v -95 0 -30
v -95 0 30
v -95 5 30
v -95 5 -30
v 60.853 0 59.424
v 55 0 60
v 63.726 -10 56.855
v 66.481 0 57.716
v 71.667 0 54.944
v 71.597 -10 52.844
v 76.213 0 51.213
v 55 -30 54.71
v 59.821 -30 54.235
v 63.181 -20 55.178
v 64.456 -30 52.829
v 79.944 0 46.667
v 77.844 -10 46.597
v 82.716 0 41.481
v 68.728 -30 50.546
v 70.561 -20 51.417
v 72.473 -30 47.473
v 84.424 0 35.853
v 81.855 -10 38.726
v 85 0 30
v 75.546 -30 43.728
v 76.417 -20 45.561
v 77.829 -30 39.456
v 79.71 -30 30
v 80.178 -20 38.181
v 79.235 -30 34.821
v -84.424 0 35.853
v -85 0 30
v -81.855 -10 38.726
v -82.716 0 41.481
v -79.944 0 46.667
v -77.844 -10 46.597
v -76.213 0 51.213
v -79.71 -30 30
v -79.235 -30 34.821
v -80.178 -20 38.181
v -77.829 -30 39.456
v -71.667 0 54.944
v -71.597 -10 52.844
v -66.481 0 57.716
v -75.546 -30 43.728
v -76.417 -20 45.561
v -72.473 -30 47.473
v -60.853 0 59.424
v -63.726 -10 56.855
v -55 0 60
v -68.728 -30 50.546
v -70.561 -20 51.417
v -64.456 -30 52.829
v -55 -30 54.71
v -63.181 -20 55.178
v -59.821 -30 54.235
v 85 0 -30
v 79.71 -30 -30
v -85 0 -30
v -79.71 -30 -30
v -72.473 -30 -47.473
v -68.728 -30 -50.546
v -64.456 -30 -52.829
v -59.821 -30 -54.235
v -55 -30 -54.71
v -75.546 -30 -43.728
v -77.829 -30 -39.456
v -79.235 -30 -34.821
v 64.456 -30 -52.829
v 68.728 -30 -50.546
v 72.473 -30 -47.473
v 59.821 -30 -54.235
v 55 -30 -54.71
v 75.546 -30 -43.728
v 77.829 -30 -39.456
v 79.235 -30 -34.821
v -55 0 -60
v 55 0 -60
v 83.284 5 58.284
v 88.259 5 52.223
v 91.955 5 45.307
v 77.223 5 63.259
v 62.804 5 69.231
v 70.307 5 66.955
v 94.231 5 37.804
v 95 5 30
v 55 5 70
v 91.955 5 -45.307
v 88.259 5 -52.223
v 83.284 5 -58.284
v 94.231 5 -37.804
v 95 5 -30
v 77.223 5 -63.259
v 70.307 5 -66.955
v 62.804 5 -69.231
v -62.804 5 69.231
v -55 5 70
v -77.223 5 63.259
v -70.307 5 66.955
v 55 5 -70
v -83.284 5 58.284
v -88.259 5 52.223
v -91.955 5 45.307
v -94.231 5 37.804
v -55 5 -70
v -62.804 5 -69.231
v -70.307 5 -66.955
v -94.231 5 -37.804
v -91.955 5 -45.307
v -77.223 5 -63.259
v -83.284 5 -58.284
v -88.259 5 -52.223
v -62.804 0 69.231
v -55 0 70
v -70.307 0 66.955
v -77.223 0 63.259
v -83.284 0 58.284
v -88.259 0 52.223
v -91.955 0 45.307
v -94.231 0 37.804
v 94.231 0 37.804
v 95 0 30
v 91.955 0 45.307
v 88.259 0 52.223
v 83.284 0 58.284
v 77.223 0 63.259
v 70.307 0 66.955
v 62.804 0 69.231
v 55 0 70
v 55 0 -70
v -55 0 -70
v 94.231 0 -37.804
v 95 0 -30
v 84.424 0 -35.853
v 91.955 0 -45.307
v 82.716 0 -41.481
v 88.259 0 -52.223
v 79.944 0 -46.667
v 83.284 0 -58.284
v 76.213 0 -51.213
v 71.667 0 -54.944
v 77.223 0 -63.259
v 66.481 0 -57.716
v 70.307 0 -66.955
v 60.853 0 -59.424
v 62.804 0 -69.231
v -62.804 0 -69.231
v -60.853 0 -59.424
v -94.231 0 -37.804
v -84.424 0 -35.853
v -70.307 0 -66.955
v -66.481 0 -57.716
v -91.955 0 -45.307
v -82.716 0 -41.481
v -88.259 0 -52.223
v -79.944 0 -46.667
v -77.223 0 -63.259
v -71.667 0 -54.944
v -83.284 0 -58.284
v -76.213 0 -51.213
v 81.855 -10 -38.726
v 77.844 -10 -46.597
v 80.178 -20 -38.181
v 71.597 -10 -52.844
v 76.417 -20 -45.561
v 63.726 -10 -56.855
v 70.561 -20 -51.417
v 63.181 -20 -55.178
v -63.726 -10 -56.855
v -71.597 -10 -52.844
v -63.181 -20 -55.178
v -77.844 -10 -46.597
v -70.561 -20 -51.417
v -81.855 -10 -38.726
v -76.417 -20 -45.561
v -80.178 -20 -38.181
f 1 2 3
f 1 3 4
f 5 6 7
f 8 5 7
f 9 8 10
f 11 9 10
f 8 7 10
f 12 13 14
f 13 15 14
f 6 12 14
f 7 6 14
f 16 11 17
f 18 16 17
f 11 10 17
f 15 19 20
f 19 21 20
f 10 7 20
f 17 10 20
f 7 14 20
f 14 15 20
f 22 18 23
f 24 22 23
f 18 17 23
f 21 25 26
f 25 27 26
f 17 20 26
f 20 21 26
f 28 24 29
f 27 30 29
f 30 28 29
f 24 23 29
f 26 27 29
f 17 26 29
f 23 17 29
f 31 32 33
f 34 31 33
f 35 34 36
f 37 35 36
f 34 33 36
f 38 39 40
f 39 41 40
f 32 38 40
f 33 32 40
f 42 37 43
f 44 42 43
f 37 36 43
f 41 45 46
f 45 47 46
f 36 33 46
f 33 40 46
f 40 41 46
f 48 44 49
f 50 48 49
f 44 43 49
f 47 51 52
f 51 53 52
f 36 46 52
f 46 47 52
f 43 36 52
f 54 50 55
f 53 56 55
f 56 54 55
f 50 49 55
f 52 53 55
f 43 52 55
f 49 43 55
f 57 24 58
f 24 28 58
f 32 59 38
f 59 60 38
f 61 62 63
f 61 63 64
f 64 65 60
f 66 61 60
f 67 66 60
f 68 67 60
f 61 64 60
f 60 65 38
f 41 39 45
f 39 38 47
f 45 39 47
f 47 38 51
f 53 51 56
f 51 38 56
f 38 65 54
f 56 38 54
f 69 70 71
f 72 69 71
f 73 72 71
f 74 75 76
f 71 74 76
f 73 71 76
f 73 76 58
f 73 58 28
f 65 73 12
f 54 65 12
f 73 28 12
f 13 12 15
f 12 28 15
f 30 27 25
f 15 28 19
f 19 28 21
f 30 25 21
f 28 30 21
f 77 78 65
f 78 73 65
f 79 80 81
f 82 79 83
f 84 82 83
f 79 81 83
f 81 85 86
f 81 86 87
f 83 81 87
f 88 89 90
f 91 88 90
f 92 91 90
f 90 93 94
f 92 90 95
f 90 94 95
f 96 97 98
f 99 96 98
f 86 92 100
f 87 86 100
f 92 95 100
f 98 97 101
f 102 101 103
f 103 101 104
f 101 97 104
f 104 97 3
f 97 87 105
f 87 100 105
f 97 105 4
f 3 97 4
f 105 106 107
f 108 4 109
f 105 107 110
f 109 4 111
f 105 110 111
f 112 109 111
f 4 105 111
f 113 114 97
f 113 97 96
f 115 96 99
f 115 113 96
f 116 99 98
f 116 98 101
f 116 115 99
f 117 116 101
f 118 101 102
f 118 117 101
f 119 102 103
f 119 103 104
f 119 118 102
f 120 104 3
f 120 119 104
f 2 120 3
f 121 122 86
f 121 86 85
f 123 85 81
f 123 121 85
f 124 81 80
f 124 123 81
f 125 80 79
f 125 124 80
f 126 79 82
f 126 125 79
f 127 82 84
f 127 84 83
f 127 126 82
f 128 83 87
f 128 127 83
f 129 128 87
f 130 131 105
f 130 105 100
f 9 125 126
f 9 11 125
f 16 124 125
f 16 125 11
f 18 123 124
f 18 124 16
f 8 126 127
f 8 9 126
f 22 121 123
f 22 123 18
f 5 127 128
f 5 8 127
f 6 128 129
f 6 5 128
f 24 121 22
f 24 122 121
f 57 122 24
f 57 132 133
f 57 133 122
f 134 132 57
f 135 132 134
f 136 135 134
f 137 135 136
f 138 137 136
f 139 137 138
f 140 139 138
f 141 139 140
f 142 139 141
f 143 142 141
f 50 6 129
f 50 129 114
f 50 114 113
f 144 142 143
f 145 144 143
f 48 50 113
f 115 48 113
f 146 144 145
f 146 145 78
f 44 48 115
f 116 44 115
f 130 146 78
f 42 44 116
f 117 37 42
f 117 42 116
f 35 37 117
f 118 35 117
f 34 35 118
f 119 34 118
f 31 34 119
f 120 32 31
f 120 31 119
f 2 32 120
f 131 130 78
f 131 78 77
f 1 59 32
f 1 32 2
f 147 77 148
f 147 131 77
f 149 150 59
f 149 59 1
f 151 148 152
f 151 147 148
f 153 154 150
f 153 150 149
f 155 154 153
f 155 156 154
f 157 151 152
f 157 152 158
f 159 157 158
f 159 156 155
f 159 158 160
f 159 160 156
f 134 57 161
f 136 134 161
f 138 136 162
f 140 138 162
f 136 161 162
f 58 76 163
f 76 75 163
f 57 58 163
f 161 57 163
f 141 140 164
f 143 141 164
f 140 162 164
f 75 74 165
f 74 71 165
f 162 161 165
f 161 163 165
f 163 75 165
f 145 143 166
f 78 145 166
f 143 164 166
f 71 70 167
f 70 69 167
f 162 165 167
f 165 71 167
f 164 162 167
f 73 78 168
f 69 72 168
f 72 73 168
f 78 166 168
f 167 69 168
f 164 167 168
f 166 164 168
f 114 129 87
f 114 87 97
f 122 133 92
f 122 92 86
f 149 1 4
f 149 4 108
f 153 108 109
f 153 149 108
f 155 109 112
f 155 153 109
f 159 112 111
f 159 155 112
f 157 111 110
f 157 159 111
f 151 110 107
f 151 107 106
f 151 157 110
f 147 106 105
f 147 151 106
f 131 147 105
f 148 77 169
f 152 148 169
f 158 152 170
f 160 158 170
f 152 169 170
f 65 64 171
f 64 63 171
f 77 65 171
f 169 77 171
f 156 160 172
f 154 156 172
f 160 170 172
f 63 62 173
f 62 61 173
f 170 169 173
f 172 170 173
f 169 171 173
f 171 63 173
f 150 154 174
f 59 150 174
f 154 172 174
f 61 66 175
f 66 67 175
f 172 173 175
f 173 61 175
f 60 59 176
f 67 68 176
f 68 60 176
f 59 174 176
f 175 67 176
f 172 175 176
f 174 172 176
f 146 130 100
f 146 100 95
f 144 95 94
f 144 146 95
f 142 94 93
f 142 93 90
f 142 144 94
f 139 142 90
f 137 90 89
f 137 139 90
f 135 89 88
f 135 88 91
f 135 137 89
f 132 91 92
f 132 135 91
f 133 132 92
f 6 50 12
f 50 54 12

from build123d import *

# Parameters (mm, degrees)
BOSS_EXTRUDE1_DEPTH = 5
BOSS_EXTRUDE2_DEPTH = 30
BOSS_EXTRUDE2_DRAFT = -10


with BuildPart() as part:
    # Sketch1 → Boss-Extrude1 (new body)
    with BuildSketch(Plane(origin=(0, 0, 0), x_dir=(1, 0, 0), z_dir=(0, 1, 0))):
        with BuildLine():
            Line((55, 70), (-55, 70))
            ThreePointArc((-55, 70), (-83.284271247, 58.284271247), (-95, 30))
            Line((-95, 30), (-95, -30))
            ThreePointArc((-95, -30), (-83.284271247, -58.284271247), (-55, -70))
            Line((-55, -70), (55, -70))
            ThreePointArc((55, -70), (83.284271247, -58.284271247), (95, -30))
            Line((95, -30), (95, 30))
            ThreePointArc((95, 30), (83.284271247, 58.284271247), (55, 70))
        make_face()
    extrude(amount=BOSS_EXTRUDE1_DEPTH)


with BuildPart() as boss_extrude2_tool:
    # Sketch1<4> → Boss-Extrude2 (with draft: the straight prism first)
    with BuildSketch(Plane(origin=(0, 0, 0), x_dir=(1, 0, 0), z_dir=(0, 1, 0))):
        with BuildLine():
            Line((-55, -60), (55, -60))
            ThreePointArc((55, -60), (76.213203436, -51.213203436), (85, -30))
            Line((85, -30), (85, 30))
            ThreePointArc((85, 30), (76.213203436, 51.213203436), (55, 60))
            Line((55, 60), (-55, 60))
            ThreePointArc((-55, 60), (-76.213203436, 51.213203436), (-85, 30))
            Line((-85, 30), (-85, -30))
            ThreePointArc((-85, -30), (-76.213203436, -51.213203436), (-55, -60))
        make_face()
    extrude(amount=-BOSS_EXTRUDE2_DEPTH)
    # Boss-Extrude2: the draft: its side faces are tilted about the plane it starts from
    boss_extrude2_sides = [boss_extrude2_tool.faces().sort_by_distance(p)[0] for p in [
        (0, -15, 60),
        (76.213203436, -15, 51.213203436),
        (85, -15, 0),
        (76.213203436, -15, -51.213203436),
        (0, -15, -60),
        (-76.213203436, -15, -51.213203436),
        (-85, -15, 0),
        (-76.213203436, -15, 51.213203436),
    ]]
    draft(boss_extrude2_sides, Plane(origin=(0, 0, 0), x_dir=(1, 0, 0), z_dir=(0, 1, 0)), BOSS_EXTRUDE2_DRAFT)


with BuildPart() as part_1:
    add(part.part)

    # Boss-Extrude2: add boss_extrude2_tool
    add(boss_extrude2_tool.part)


solid = part_1.part
